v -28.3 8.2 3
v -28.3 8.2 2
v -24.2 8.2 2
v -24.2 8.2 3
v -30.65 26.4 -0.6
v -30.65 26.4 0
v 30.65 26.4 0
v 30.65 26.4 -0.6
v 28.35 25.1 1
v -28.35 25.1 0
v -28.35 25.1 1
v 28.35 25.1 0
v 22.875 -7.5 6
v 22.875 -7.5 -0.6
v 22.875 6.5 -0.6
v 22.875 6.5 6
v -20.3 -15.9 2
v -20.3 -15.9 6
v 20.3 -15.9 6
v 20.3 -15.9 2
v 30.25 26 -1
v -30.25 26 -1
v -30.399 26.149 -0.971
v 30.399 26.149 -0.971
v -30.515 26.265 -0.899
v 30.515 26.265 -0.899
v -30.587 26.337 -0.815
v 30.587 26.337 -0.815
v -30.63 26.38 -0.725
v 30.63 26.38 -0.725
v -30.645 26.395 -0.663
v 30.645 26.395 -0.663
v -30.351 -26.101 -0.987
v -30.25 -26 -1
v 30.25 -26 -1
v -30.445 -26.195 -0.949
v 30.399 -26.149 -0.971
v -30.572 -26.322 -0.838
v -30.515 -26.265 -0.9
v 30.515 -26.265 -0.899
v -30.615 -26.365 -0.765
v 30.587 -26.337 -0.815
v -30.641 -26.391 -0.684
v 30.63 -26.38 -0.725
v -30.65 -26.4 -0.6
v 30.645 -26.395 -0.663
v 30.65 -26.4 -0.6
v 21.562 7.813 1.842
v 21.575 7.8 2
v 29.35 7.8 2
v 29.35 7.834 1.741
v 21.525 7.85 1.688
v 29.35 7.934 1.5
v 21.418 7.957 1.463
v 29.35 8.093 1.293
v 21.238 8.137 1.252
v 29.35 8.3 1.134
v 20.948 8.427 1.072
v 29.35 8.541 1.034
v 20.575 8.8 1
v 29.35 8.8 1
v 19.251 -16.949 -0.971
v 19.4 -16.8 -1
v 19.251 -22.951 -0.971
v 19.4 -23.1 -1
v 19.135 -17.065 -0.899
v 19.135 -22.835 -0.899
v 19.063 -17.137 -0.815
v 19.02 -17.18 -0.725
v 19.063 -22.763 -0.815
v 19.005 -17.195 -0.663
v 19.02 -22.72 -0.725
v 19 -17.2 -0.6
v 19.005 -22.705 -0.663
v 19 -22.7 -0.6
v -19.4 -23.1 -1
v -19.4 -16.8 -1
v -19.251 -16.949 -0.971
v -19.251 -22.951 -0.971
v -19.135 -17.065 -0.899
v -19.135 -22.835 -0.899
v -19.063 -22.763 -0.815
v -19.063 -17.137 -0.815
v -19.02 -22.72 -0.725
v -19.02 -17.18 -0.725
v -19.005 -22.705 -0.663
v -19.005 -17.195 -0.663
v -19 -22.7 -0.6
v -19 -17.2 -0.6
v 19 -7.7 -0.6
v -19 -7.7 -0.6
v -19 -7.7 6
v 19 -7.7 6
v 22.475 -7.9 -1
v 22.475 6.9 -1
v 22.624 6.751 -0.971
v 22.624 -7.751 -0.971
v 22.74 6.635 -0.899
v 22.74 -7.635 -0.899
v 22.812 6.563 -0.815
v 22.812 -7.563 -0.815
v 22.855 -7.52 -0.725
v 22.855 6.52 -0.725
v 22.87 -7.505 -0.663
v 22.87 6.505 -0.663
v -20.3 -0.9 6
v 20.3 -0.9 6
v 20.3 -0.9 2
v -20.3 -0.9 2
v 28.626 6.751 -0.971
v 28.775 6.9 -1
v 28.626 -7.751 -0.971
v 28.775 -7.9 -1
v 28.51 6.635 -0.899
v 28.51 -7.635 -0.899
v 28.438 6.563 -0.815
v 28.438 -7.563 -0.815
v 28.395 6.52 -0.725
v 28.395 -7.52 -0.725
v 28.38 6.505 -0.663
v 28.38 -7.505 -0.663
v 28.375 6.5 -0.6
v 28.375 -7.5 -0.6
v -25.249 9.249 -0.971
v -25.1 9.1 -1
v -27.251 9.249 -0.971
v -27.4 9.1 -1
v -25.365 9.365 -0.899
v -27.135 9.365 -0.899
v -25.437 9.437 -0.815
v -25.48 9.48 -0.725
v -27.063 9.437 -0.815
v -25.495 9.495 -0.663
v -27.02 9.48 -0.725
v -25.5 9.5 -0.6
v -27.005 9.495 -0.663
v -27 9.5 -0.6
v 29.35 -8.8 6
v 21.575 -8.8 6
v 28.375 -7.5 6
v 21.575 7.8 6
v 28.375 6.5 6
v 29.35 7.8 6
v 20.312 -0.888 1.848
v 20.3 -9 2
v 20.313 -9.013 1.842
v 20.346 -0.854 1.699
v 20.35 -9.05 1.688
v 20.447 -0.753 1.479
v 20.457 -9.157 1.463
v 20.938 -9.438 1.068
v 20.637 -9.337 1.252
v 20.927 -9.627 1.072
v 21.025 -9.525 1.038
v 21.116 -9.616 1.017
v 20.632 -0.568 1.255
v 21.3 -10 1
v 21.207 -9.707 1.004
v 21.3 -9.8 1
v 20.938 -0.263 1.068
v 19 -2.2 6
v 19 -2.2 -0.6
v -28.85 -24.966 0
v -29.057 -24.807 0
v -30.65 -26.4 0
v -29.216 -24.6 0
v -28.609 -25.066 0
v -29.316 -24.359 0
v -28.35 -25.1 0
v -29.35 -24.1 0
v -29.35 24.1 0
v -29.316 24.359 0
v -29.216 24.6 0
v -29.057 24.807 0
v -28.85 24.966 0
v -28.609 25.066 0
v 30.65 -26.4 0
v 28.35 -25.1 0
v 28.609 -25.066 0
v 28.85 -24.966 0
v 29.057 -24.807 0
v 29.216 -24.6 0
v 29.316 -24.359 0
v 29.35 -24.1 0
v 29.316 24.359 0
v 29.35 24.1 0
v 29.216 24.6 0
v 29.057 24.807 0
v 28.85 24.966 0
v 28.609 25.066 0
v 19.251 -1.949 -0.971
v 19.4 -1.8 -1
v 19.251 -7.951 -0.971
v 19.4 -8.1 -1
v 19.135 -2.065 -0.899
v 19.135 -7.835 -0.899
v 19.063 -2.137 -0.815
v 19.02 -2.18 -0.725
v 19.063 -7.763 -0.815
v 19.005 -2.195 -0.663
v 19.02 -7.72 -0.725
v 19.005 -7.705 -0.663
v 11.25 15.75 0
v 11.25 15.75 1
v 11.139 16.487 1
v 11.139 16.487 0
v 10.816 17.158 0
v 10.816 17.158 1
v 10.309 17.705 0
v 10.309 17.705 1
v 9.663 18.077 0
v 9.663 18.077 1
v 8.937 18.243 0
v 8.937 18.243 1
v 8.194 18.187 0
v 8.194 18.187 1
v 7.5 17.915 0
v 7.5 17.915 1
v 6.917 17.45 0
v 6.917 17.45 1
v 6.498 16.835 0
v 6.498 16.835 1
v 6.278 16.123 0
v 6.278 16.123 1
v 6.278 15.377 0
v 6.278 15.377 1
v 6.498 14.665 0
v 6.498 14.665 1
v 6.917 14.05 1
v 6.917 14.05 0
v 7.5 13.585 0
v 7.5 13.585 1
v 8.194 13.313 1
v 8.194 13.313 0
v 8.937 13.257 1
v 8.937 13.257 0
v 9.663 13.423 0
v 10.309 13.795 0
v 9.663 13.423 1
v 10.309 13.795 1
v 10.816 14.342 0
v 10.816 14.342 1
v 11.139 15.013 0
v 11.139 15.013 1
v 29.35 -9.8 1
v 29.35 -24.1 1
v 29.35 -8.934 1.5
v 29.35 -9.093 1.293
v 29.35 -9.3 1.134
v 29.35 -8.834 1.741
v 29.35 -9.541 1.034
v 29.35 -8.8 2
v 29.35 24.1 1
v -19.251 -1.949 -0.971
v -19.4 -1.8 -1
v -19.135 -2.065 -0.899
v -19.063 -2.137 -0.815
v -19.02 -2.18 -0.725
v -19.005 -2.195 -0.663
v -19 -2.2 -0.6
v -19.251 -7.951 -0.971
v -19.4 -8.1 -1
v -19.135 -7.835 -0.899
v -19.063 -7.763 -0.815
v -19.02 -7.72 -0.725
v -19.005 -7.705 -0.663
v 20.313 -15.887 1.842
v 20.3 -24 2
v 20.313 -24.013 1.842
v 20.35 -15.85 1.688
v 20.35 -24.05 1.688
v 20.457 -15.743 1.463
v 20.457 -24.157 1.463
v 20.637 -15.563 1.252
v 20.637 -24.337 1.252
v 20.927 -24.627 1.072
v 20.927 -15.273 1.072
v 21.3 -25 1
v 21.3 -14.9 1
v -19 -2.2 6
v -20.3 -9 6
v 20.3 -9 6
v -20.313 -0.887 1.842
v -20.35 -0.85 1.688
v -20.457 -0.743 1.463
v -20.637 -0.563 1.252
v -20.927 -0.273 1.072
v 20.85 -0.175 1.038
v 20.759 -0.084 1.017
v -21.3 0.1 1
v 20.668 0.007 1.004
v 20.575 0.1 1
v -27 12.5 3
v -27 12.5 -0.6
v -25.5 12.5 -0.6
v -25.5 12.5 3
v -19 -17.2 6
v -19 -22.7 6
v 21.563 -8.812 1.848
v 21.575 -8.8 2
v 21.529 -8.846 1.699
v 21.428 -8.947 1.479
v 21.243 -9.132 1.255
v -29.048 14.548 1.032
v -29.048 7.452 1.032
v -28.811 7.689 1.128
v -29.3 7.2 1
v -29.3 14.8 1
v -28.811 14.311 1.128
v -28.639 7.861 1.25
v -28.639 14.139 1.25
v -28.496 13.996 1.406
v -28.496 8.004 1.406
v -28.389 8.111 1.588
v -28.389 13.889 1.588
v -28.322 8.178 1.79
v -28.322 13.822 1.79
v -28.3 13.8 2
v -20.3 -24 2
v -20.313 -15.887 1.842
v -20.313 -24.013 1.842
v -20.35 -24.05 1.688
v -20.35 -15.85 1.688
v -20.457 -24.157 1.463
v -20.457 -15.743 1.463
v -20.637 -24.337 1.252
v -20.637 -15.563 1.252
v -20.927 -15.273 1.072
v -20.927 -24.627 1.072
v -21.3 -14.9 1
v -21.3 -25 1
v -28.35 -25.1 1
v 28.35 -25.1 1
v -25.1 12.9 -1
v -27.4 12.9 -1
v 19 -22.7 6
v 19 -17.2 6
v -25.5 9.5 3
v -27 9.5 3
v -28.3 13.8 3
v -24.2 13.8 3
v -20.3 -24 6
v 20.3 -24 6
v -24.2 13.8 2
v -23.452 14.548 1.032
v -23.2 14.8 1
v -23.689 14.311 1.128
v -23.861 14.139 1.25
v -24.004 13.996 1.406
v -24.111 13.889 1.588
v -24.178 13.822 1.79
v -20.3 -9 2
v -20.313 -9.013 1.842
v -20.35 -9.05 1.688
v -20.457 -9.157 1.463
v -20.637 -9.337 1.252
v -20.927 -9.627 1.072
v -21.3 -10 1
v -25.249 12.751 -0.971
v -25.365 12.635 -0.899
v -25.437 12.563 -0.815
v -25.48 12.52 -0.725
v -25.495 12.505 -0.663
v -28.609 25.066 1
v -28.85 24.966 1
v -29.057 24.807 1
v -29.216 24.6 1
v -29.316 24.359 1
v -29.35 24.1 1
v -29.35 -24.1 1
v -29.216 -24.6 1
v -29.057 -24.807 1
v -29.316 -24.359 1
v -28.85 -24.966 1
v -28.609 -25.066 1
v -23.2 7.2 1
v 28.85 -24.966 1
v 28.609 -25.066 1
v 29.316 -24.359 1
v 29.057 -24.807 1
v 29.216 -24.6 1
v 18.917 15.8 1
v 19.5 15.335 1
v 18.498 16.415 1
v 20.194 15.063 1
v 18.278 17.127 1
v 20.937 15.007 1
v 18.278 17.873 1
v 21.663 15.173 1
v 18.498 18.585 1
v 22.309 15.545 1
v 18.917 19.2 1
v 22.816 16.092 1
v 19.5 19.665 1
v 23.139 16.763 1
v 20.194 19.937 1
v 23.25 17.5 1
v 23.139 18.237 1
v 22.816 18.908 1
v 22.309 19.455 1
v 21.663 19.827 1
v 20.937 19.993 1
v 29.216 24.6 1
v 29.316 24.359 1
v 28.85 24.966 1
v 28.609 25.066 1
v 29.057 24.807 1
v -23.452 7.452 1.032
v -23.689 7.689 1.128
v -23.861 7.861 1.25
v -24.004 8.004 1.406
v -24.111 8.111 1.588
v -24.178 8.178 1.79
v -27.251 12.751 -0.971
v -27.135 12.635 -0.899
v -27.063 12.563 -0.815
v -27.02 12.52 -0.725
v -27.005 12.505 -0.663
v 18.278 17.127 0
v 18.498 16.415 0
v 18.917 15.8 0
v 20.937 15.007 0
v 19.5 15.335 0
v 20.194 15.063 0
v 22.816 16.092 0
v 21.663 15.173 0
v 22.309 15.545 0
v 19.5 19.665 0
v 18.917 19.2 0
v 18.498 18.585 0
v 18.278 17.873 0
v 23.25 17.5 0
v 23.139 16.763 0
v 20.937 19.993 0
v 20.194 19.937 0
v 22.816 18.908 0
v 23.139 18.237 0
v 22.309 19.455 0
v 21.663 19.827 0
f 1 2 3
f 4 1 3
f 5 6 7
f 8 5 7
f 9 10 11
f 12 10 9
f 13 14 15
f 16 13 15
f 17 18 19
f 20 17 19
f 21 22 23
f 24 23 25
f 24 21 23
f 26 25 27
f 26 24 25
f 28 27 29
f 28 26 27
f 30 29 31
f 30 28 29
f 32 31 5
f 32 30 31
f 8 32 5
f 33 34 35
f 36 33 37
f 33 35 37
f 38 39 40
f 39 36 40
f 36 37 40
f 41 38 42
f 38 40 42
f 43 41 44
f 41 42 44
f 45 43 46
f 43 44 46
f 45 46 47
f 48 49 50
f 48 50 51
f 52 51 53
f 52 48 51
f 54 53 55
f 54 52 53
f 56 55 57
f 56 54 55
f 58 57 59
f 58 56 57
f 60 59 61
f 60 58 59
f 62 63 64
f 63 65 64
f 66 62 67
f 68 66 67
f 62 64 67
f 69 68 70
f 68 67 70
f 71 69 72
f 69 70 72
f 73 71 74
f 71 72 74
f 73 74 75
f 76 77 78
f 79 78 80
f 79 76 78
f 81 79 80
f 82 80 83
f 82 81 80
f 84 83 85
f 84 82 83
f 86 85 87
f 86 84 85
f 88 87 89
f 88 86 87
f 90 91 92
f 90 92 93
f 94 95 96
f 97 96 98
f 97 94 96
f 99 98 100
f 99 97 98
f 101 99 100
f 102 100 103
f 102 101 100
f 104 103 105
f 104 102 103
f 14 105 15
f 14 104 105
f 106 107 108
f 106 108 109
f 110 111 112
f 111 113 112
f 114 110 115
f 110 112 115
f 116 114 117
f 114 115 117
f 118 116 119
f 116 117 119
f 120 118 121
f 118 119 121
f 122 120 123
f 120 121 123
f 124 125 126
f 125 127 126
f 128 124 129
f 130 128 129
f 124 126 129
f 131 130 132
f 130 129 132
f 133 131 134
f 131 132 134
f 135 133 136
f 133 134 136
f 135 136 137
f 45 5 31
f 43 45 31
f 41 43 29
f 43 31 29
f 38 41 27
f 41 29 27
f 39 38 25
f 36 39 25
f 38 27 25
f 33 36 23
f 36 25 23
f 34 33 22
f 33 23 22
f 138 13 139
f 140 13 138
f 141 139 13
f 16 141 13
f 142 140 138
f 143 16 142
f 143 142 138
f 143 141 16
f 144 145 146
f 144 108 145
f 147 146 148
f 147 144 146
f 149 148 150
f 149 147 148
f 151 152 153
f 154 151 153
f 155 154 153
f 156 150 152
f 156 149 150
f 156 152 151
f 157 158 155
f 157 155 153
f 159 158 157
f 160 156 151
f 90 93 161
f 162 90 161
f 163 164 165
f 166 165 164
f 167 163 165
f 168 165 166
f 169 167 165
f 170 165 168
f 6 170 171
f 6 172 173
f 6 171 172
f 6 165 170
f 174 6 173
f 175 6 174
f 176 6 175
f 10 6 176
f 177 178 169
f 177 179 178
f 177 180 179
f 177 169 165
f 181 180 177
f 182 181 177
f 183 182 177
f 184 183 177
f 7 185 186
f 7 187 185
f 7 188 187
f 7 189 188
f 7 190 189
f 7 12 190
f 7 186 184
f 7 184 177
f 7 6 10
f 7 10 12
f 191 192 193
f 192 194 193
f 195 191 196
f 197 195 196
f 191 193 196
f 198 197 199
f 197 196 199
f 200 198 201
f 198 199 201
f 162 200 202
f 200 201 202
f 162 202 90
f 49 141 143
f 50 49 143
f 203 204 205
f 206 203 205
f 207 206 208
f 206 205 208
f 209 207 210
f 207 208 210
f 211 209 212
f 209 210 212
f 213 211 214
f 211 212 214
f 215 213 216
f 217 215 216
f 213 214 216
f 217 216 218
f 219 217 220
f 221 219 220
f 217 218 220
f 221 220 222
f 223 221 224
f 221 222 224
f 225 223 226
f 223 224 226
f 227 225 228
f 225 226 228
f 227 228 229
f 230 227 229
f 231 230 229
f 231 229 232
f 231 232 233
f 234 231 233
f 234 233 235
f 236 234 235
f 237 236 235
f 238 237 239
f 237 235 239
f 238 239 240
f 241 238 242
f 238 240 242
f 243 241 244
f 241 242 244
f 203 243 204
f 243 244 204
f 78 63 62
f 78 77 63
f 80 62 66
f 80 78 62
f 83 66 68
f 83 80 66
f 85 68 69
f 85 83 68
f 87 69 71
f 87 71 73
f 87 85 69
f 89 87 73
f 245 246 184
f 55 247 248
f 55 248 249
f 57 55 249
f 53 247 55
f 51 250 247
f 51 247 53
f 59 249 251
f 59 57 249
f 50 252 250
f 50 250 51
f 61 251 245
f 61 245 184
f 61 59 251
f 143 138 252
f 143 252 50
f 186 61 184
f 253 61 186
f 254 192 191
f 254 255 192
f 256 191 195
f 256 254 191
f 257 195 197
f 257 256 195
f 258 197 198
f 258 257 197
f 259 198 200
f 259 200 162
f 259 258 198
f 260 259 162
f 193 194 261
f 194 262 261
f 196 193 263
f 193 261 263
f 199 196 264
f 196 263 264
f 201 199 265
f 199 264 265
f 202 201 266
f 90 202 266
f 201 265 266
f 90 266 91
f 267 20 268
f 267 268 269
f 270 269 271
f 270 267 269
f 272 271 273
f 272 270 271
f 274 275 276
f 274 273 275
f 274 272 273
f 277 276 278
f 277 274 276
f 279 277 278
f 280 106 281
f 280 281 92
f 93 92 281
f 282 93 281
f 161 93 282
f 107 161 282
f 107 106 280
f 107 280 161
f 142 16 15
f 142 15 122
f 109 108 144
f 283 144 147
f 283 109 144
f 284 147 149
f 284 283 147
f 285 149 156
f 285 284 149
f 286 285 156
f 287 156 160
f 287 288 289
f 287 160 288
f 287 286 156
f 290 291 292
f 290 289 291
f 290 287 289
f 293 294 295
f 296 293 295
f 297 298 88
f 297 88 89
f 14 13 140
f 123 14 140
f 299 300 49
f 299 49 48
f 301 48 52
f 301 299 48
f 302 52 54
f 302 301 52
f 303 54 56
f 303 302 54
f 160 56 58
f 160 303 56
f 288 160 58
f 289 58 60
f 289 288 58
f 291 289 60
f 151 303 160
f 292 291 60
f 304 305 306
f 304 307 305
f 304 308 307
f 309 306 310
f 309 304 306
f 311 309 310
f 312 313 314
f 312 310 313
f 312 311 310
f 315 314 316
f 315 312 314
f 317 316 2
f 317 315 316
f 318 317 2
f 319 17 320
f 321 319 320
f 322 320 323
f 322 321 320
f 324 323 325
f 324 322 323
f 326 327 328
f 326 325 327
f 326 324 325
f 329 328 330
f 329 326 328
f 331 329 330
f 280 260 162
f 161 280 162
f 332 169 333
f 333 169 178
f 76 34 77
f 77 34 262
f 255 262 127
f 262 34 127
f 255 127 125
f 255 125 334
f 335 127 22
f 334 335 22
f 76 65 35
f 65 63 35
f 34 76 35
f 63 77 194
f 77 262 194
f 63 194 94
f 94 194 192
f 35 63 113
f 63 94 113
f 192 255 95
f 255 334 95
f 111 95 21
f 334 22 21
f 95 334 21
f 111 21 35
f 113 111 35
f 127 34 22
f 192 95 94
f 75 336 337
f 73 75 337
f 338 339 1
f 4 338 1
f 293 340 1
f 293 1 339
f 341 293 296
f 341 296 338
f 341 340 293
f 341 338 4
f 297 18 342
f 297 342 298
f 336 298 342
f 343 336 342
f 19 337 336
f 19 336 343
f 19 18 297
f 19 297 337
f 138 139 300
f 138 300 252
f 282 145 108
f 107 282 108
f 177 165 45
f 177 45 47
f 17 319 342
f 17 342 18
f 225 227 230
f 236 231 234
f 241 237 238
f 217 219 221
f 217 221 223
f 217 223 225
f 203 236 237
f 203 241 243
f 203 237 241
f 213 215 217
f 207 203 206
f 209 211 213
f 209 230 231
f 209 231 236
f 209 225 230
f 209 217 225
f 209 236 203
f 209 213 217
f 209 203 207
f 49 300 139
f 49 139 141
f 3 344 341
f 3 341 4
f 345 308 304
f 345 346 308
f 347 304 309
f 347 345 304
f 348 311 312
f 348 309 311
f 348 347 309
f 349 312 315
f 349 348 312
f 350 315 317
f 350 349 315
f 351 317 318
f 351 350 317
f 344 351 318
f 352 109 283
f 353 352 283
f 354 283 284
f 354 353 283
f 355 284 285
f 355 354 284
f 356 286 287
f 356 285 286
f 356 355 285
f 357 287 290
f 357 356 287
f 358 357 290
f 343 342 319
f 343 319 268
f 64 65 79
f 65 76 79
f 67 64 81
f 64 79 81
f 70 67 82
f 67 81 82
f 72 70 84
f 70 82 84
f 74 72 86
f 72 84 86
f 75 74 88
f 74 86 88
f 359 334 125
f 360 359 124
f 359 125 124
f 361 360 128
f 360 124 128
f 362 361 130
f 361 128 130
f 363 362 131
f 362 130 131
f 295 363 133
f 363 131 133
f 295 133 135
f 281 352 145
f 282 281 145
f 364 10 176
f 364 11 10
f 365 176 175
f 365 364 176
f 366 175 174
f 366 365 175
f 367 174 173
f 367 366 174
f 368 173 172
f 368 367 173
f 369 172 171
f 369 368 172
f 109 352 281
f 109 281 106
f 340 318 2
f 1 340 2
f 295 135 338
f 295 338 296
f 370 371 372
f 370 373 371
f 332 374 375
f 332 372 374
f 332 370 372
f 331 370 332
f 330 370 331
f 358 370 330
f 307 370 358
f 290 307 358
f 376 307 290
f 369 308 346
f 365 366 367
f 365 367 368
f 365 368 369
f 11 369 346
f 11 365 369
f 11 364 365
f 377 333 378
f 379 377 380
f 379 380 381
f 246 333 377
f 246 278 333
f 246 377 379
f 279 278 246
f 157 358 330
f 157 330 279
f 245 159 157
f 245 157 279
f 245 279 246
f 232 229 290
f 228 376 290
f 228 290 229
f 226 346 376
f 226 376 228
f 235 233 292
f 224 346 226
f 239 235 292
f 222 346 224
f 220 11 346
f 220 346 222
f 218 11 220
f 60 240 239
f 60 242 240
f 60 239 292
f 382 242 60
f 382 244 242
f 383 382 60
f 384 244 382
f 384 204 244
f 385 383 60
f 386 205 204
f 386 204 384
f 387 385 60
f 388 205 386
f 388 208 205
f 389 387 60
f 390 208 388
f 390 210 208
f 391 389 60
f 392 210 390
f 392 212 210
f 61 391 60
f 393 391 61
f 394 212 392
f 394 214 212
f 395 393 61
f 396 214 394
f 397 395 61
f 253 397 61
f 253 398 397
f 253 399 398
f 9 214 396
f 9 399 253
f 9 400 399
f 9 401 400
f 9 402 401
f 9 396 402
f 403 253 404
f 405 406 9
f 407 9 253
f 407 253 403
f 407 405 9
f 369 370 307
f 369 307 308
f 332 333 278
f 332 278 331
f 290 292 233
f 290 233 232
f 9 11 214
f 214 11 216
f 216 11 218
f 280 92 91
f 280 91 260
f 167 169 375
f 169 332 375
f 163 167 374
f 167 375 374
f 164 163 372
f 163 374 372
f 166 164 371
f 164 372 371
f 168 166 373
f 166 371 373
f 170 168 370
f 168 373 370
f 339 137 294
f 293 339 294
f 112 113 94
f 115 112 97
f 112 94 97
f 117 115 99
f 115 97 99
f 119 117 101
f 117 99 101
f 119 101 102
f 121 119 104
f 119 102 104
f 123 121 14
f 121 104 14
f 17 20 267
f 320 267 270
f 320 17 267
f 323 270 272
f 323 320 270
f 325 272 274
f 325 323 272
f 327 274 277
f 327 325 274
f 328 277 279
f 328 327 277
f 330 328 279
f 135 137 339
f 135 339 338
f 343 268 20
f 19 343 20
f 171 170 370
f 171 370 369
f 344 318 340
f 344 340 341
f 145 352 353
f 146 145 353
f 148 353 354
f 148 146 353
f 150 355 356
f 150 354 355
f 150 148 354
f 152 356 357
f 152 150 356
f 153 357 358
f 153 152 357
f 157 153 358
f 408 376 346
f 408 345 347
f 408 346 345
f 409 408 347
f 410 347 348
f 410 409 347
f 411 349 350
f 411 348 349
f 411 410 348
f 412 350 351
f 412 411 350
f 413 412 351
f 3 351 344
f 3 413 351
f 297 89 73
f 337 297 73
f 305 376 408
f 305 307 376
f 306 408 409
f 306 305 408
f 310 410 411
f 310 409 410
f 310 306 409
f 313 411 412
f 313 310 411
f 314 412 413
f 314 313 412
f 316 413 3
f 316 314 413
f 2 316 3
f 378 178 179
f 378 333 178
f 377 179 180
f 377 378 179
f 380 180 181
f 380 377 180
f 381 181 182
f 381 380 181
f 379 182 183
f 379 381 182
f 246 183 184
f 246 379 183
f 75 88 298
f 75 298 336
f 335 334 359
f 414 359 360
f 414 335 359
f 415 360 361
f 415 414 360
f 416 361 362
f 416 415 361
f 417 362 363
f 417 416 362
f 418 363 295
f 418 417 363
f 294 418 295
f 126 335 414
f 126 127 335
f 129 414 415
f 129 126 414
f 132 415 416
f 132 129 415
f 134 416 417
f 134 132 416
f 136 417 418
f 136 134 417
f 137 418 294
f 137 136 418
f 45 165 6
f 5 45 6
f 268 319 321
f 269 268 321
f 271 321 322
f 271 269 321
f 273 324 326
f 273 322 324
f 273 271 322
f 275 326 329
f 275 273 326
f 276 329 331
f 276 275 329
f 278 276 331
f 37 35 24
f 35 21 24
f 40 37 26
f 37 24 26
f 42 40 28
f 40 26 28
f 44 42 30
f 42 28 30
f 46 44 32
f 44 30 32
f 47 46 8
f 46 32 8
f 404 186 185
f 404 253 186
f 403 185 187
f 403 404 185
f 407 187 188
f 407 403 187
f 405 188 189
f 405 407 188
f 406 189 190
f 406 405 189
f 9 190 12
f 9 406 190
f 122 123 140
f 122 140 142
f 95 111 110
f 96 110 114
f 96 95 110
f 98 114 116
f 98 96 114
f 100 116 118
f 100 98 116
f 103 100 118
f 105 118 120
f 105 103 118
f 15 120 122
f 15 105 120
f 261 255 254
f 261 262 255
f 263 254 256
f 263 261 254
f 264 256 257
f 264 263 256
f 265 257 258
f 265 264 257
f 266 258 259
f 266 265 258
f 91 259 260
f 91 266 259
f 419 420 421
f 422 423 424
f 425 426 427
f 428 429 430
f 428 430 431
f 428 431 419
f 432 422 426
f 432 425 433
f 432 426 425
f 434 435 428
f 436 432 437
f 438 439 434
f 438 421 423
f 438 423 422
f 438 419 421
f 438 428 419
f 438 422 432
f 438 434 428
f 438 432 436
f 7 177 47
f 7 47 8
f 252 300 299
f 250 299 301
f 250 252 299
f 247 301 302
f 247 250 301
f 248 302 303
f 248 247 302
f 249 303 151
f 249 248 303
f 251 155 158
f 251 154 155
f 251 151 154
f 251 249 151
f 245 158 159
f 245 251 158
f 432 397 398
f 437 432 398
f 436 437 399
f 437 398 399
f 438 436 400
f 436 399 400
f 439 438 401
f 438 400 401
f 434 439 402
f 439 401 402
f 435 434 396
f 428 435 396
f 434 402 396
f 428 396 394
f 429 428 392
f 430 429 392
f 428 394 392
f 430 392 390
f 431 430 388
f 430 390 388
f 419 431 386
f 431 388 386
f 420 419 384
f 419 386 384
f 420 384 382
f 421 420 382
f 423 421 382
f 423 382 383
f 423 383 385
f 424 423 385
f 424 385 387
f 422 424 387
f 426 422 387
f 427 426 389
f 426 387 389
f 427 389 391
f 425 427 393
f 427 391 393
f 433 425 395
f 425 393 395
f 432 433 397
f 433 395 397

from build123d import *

# Parameters (mm, degrees)
OUTSIDE_DIM_W                         = 61.3
OUTSIDE_DIM_H                         = 52.8
DODANIE_WYCI_GNI_CIE1_DEPTH           = 1
INSIDE_DIM_W                          = 58.7
INSIDE_DIM_H                          = 50.2
DODANIE_WYCI_GNI_CIE2_DEPTH           = 1
CAPACITORS_R                          = 2.5
CAPACITORS_CUTOUT_DEPTH               = 1
RESET_BUTTON_W                        = 4.1
RESET_BUTTON_H                        = 5.6
RESET_BUTTON_SHIELD_DEPTH             = 2
RESET_BUTTON_CUTOUT_DEPTH             = 41.501635769
RESET_BUTTON_CUTOUT_DEPTH_BACK        = 41.501635769
SZKIC5_3_W                            = 1.5
SZKIC5_3_H                            = 3
SWDIO_W                               = 7.775
SWDIO_H                               = 16.6
SWDIO_SHIELD_DEPTH                    = 5
SWDIO_CUTOUT_DEPTH                    = 41.760060108
SWDIO_CUTOUT_DEPTH_BACK               = 41.760060108
SZKIC6_3_W                            = 5.5
SZKIC6_3_H                            = 14
ART_SKIN_CONNECTORS_W                 = 40.6
ART_SKIN_CONNECTORS_H                 = 8.1
ART_SKIN_CONNECTORS_W_2               = 38
ART_SKIN_CONNECTORS_H_2               = 5.5
ART_SKIN_CONNECTORS_SHIELD_DEPTH      = 5
ART_SKIN_CONNECTORS_CUTOUT_DEPTH      = 41.760060108
ART_SKIN_CONNECTORS_CUTOUT_DEPTH_BACK = 41.760060108
SZKIC7_2_W                            = 38
SZKIC7_2_H                            = 5.5
BOTTOM_OF_PRINT_CURVE_R               = 0.4
SIDE_MOUNT_SURVE_R                    = 1
CURVE_ALL_SHIELDS_R                   = 1


with BuildPart() as part:
    # Outside dim → Dodanie-wyciągnięcie1 (new body)
    with BuildSketch(Plane.XY):
        Rectangle(OUTSIDE_DIM_W, OUTSIDE_DIM_H)
    extrude(amount=-DODANIE_WYCI_GNI_CIE1_DEPTH)

    # Inside dim → Dodanie-wyciągnięcie2 (add)
    with BuildSketch(Plane.XY):
        Rectangle(INSIDE_DIM_W, INSIDE_DIM_H)
    extrude(amount=DODANIE_WYCI_GNI_CIE2_DEPTH)

    # Capacitors → Capacitors cutout (cut)
    with BuildSketch(Plane.XY.offset(1)):
        with Locations((8.75, 15.75)):
            Circle(CAPACITORS_R)
        with Locations((20.75, 17.5)):
            Circle(CAPACITORS_R)
    extrude(amount=-CAPACITORS_CUTOUT_DEPTH, mode=Mode.SUBTRACT)

    # Reset button → Reset button shield (add)
    with BuildSketch(Plane.XY.offset(1)):
        with Locations((-26.25, 11)):
            Rectangle(RESET_BUTTON_W, RESET_BUTTON_H)
    extrude(amount=RESET_BUTTON_SHIELD_DEPTH)

    # Szkic5<3> → Reset button cutout (cut, two sides: drawn at the far end of the back side and taken through both)
    with BuildSketch(Plane.XY.offset(1).offset(-RESET_BUTTON_CUTOUT_DEPTH_BACK)):
        with Locations((-26.25, 11)):
            Rectangle(SZKIC5_3_W, SZKIC5_3_H)
    extrude(amount=RESET_BUTTON_CUTOUT_DEPTH + RESET_BUTTON_CUTOUT_DEPTH_BACK, mode=Mode.SUBTRACT)

    # SWDIO → SWDIO shield (add)
    with BuildSketch(Plane.XY.offset(1)):
        with Locations((25.4625, -0.5)):
            Rectangle(SWDIO_W, SWDIO_H)
    extrude(amount=SWDIO_SHIELD_DEPTH)

    # Szkic6<3> → SWDIO cutout (cut, two sides: drawn at the far end of the back side and taken through both)
    with BuildSketch(Plane.XY.offset(1).offset(-SWDIO_CUTOUT_DEPTH_BACK)):
        with Locations((25.625, -0.5)):
            Rectangle(SZKIC6_3_W, SZKIC6_3_H)
    extrude(amount=SWDIO_CUTOUT_DEPTH + SWDIO_CUTOUT_DEPTH_BACK, mode=Mode.SUBTRACT)

    # Art skin connectors → Art skin connectors shield (add)
    # profile 1 of 2: a face of its own
    with BuildSketch(Plane.XY.offset(1)):
        with Locations((0, -19.95)):
            Rectangle(ART_SKIN_CONNECTORS_W, ART_SKIN_CONNECTORS_H)
        with Locations((0, -19.95)):
            Rectangle(ART_SKIN_CONNECTORS_W_2, ART_SKIN_CONNECTORS_H_2, mode=Mode.SUBTRACT)
    # profile 2 of 2: a face of its own
    with BuildSketch(Plane.XY.offset(1)):
        with Locations((0, -4.95)):
            Rectangle(ART_SKIN_CONNECTORS_W, ART_SKIN_CONNECTORS_H)
        with Locations((0, -4.95)):
            Rectangle(ART_SKIN_CONNECTORS_W_2, ART_SKIN_CONNECTORS_H_2, mode=Mode.SUBTRACT)
    extrude(amount=ART_SKIN_CONNECTORS_SHIELD_DEPTH)

    # Szkic7<2> → Art skin connectors cutout (cut, two sides: drawn at the far end of the back side and taken through both)
    with BuildSketch(Plane.XY.offset(1).offset(-ART_SKIN_CONNECTORS_CUTOUT_DEPTH_BACK)):
        with Locations((0, -4.95)):
            Rectangle(SZKIC7_2_W, SZKIC7_2_H)
        with Locations((0, -19.95)):
            Rectangle(SZKIC7_2_W, SZKIC7_2_H)
    extrude(amount=ART_SKIN_CONNECTORS_CUTOUT_DEPTH + ART_SKIN_CONNECTORS_CUTOUT_DEPTH_BACK, mode=Mode.SUBTRACT)

    # Bottom of print curve
    bottom_of_print_curve_edges = [part.edges().sort_by_distance(p)[0] for p in [
        (30.65, 0, -1),
        (0, -22.7, -1),
        (-19, -19.95, -1),
        (0, -17.2, -1),
        (19, -19.95, -1),
        (-19, -4.95, -1),
        (0, -7.7, -1),
        (0, -2.2, -1),
        (19, -4.95, -1),
        (0, 26.4, -1),
        (-30.65, 0, -1),
        (-27, 11, -1),
        (-26.25, 12.5, -1),
        (-25.5, 11, -1),
        (-26.25, 9.5, -1),
        (22.875, -0.5, -1),
        (25.625, -7.5, -1),
        (25.625, 6.5, -1),
        (28.375, -0.5, -1),
        (0, -26.4, -1),
    ]]
    fillet(bottom_of_print_curve_edges, radius=BOTTOM_OF_PRINT_CURVE_R)

    # Side mount surve
    side_mount_surve_edges = [part.edges().sort_by_distance(p)[0] for p in [
        (-29.35, 25.1, 0.5),
        (-29.35, -25.1, 0.5),
        (29.35, -25.1, 0.5),
        (29.35, 25.1, 0.5),
    ]]
    fillet(side_mount_surve_edges, radius=SIDE_MOUNT_SURVE_R)

    # Curve all shields
    # the kernel refuses this fillet: 1 mm, written as the material it adds along each edge
    with BuildSketch(Plane(origin=(-20.3, -24, 1), x_dir=(-1, 0, 0), z_dir=(0, 1, 0)), Plane(origin=(20.3, -0.9, 1), x_dir=(1, 0, 0), z_dir=(0, -1, 0)), Plane(origin=(-20.3, -9, 1), x_dir=(-1, 0, 0), z_dir=(0, 1, 0)), Plane(origin=(20.3, -15.9, 1), x_dir=(1, 0, 0), z_dir=(0, -1, 0))) as curve_all_shields_piece_1:
        with BuildLine():
            CenterArc((CURVE_ALL_SHIELDS_R, CURVE_ALL_SHIELDS_R), CURVE_ALL_SHIELDS_R, 180, 90)
            Line((0, CURVE_ALL_SHIELDS_R), (0, 0))
            Line((0, 0), (CURVE_ALL_SHIELDS_R, 0))
        make_face()
    extrude(amount=8.1)
    with BuildSketch(Plane(origin=(-20.3, -0.9, 1), x_dir=(0, 1, 0), z_dir=(1, 0, 0)), Plane(origin=(20.3, -9, 1), x_dir=(0, -1, 0), z_dir=(-1, 0, 0)), Plane(origin=(-20.3, -15.9, 1), x_dir=(0, 1, 0), z_dir=(1, 0, 0)), Plane(origin=(20.3, -24, 1), x_dir=(0, -1, 0), z_dir=(-1, 0, 0))) as curve_all_shields_piece_2:
        with BuildLine():
            CenterArc((CURVE_ALL_SHIELDS_R, CURVE_ALL_SHIELDS_R), CURVE_ALL_SHIELDS_R, 180, 90)
            Line((0, CURVE_ALL_SHIELDS_R), (0, 0))
            Line((0, 0), (CURVE_ALL_SHIELDS_R, 0))
        make_face()
    extrude(amount=40.6)
    with BuildSketch(Plane(origin=(-24.2, 13.8, 1), x_dir=(0, 1, 0), z_dir=(-1, 0, 0)), Plane(origin=(-28.3, 8.2, 1), x_dir=(0, -1, 0), z_dir=(1, 0, 0))) as curve_all_shields_piece_3:
        with BuildLine():
            CenterArc((CURVE_ALL_SHIELDS_R, -CURVE_ALL_SHIELDS_R), CURVE_ALL_SHIELDS_R, 90, 90)
            Line((0, -CURVE_ALL_SHIELDS_R), (0, 0))
            Line((0, 0), (CURVE_ALL_SHIELDS_R, 0))
        make_face()
    extrude(amount=4.1)
    with BuildSketch(Plane(origin=(-28.3, 13.8, 1), x_dir=(-1, 0, 0), z_dir=(0, -1, 0)), Plane(origin=(-24.2, 8.2, 1), x_dir=(1, 0, 0), z_dir=(0, 1, 0))) as curve_all_shields_piece_4:
        with BuildLine():
            CenterArc((CURVE_ALL_SHIELDS_R, -CURVE_ALL_SHIELDS_R), CURVE_ALL_SHIELDS_R, 90, 90)
            Line((0, -CURVE_ALL_SHIELDS_R), (0, 0))
            Line((0, 0), (CURVE_ALL_SHIELDS_R, 0))
        make_face()
    extrude(amount=5.6)
    with BuildSketch(Plane(origin=(21.575, -8.8, 1), x_dir=(-1, 0, 0), z_dir=(0, 1, 0))) as curve_all_shields_piece_5:
        with BuildLine():
            CenterArc((CURVE_ALL_SHIELDS_R, CURVE_ALL_SHIELDS_R), CURVE_ALL_SHIELDS_R, 180, 90)
            Line((0, CURVE_ALL_SHIELDS_R), (0, 0))
            Line((0, 0), (CURVE_ALL_SHIELDS_R, 0))
        make_face()
    extrude(amount=16.6)
    with BuildSketch(Plane(origin=(29.35, -8.8, 1), x_dir=(0, -1, 0), z_dir=(-1, 0, 0)), Plane(origin=(21.575, 7.8, 1), x_dir=(0, 1, 0), z_dir=(1, 0, 0))) as curve_all_shields_piece_6:
        with BuildLine():
            CenterArc((CURVE_ALL_SHIELDS_R, CURVE_ALL_SHIELDS_R), CURVE_ALL_SHIELDS_R, 180, 90)
            Line((0, CURVE_ALL_SHIELDS_R), (0, 0))
            Line((0, 0), (CURVE_ALL_SHIELDS_R, 0))
        make_face()
    extrude(amount=7.775)
    with BuildSketch(Plane(origin=(20.3, -24, 1), x_dir=(0, -1, 0), z_dir=(-1, 0, 0))) as curve_all_shields_piece_7a_section:
        with BuildLine():
            CenterArc((CURVE_ALL_SHIELDS_R, CURVE_ALL_SHIELDS_R), CURVE_ALL_SHIELDS_R, 180, 90)
            Line((0, CURVE_ALL_SHIELDS_R), (0, 0))
            Line((0, 0), (CURVE_ALL_SHIELDS_R, 0))
        make_face()
    curve_all_shields_piece_7a = extrude(amount=43.1, mode=Mode.PRIVATE)
    curve_all_shields_piece_7a = split(curve_all_shields_piece_7a, bisect_by=Plane(origin=(-20.3, -24.226395114, 1.226395114), z_dir=(-1, 0, 0)), keep=Keep.TOP, mode=Mode.PRIVATE)
    with BuildSketch(Plane(origin=(-20.3, -26.5, 1), x_dir=(-1, 0, 0), z_dir=(0, 1, 0))) as curve_all_shields_piece_7b_section:
        with BuildLine():
            CenterArc((CURVE_ALL_SHIELDS_R, CURVE_ALL_SHIELDS_R), CURVE_ALL_SHIELDS_R, 180, 90)
            Line((0, CURVE_ALL_SHIELDS_R), (0, 0))
            Line((0, 0), (CURVE_ALL_SHIELDS_R, 0))
        make_face()
    curve_all_shields_piece_7b = extrude(amount=10.6, mode=Mode.PRIVATE)
    curve_all_shields_piece_7b = split(curve_all_shields_piece_7b, bisect_by=Plane(origin=(-20.526395114, -25.1, 1.226395114), z_dir=(0, 1, 0)), keep=Keep.TOP, mode=Mode.PRIVATE)
    curve_all_shields_piece_7b = split(curve_all_shields_piece_7b, bisect_by=Plane(origin=(-20.526395114, -24, 1.226395114), z_dir=(0, -1, 0)), keep=Keep.TOP, mode=Mode.PRIVATE)
    curve_all_shields_piece_7 = curve_all_shields_piece_7a & curve_all_shields_piece_7b
    add(curve_all_shields_piece_7)
    with BuildSketch(Plane(origin=(-22.8, -15.9, 1), x_dir=(0, 1, 0), z_dir=(1, 0, 0))) as curve_all_shields_piece_8a_section:
        with BuildLine():
            CenterArc((CURVE_ALL_SHIELDS_R, CURVE_ALL_SHIELDS_R), CURVE_ALL_SHIELDS_R, 180, 90)
            Line((0, CURVE_ALL_SHIELDS_R), (0, 0))
            Line((0, 0), (CURVE_ALL_SHIELDS_R, 0))
        make_face()
    curve_all_shields_piece_8a = extrude(amount=43.1, mode=Mode.PRIVATE)
    curve_all_shields_piece_8a = split(curve_all_shields_piece_8a, bisect_by=Plane(origin=(-20.3, -15.673604886, 1.226395114), z_dir=(-1, 0, 0)), keep=Keep.TOP, mode=Mode.PRIVATE)
    with BuildSketch(Plane(origin=(-20.3, -24, 1), x_dir=(-1, 0, 0), z_dir=(0, 1, 0))) as curve_all_shields_piece_8b_section:
        with BuildLine():
            CenterArc((CURVE_ALL_SHIELDS_R, CURVE_ALL_SHIELDS_R), CURVE_ALL_SHIELDS_R, 180, 90)
            Line((0, CURVE_ALL_SHIELDS_R), (0, 0))
            Line((0, 0), (CURVE_ALL_SHIELDS_R, 0))
        make_face()
    curve_all_shields_piece_8b = extrude(amount=10.6, mode=Mode.PRIVATE)
    curve_all_shields_piece_8b = split(curve_all_shields_piece_8b, bisect_by=Plane(origin=(-20.526395114, -15.9, 1.226395114), z_dir=(0, 1, 0)), keep=Keep.TOP, mode=Mode.PRIVATE)
    curve_all_shields_piece_8 = curve_all_shields_piece_8a & curve_all_shields_piece_8b
    add(curve_all_shields_piece_8)
    with BuildSketch(Plane(origin=(-22.8, -0.9, 1), x_dir=(0, 1, 0), z_dir=(1, 0, 0))) as curve_all_shields_piece_9a_section:
        with BuildLine():
            CenterArc((CURVE_ALL_SHIELDS_R, CURVE_ALL_SHIELDS_R), CURVE_ALL_SHIELDS_R, 180, 90)
            Line((0, CURVE_ALL_SHIELDS_R), (0, 0))
            Line((0, 0), (CURVE_ALL_SHIELDS_R, 0))
        make_face()
    curve_all_shields_piece_9a = extrude(amount=43.1, mode=Mode.PRIVATE)
    curve_all_shields_piece_9a = split(curve_all_shields_piece_9a, bisect_by=Plane(origin=(-20.3, -0.673604886, 1.226395114), z_dir=(-1, 0, 0)), keep=Keep.TOP, mode=Mode.PRIVATE)
    with BuildSketch(Plane(origin=(-20.3, -9, 1), x_dir=(-1, 0, 0), z_dir=(0, 1, 0))) as curve_all_shields_piece_9b_section:
        with BuildLine():
            CenterArc((CURVE_ALL_SHIELDS_R, CURVE_ALL_SHIELDS_R), CURVE_ALL_SHIELDS_R, 180, 90)
            Line((0, CURVE_ALL_SHIELDS_R), (0, 0))
            Line((0, 0), (CURVE_ALL_SHIELDS_R, 0))
        make_face()
    curve_all_shields_piece_9b = extrude(amount=10.6, mode=Mode.PRIVATE)
    curve_all_shields_piece_9b = split(curve_all_shields_piece_9b, bisect_by=Plane(origin=(-20.526395114, -0.9, 1.226395114), z_dir=(0, 1, 0)), keep=Keep.TOP, mode=Mode.PRIVATE)
    curve_all_shields_piece_9 = curve_all_shields_piece_9a & curve_all_shields_piece_9b
    add(curve_all_shields_piece_9)
    with BuildSketch(Plane(origin=(-20.3, -0.9, 1), x_dir=(0, 1, 0), z_dir=(1, 0, 0))) as curve_all_shields_piece_10a_section:
        with BuildLine():
            CenterArc((CURVE_ALL_SHIELDS_R, CURVE_ALL_SHIELDS_R), CURVE_ALL_SHIELDS_R, 180, 90)
            Line((0, CURVE_ALL_SHIELDS_R), (0, 0))
            Line((0, 0), (CURVE_ALL_SHIELDS_R, 0))
        make_face()
    curve_all_shields_piece_10a = extrude(amount=43.1, mode=Mode.PRIVATE)
    curve_all_shields_piece_10a = split(curve_all_shields_piece_10a, bisect_by=Plane(origin=(20.3, -0.673604886, 1.226395114), z_dir=(1, 0, 0)), keep=Keep.TOP, mode=Mode.PRIVATE)
    with BuildSketch(Plane(origin=(20.3, 1.6, 1), x_dir=(1, 0, 0), z_dir=(0, -1, 0))) as curve_all_shields_piece_10b_section:
        with BuildLine():
            CenterArc((CURVE_ALL_SHIELDS_R, CURVE_ALL_SHIELDS_R), CURVE_ALL_SHIELDS_R, 180, 90)
            Line((0, CURVE_ALL_SHIELDS_R), (0, 0))
            Line((0, 0), (CURVE_ALL_SHIELDS_R, 0))
        make_face()
    curve_all_shields_piece_10b = extrude(amount=10.6, mode=Mode.PRIVATE)
    curve_all_shields_piece_10b = split(curve_all_shields_piece_10b, bisect_by=Plane(origin=(20.526395114, -0.9, 1.226395114), z_dir=(0, 1, 0)), keep=Keep.TOP, mode=Mode.PRIVATE)
    curve_all_shields_piece_10 = curve_all_shields_piece_10a & curve_all_shields_piece_10b
    add(curve_all_shields_piece_10)
    with BuildSketch(Plane(origin=(20.3, -0.9, 1), x_dir=(1, 0, 0), z_dir=(0, -1, 0))) as curve_all_shields_piece_11a_section:
        with BuildLine():
            CenterArc((CURVE_ALL_SHIELDS_R, CURVE_ALL_SHIELDS_R), CURVE_ALL_SHIELDS_R, 180, 90)
            Line((0, CURVE_ALL_SHIELDS_R), (0, 0))
            Line((0, 0), (CURVE_ALL_SHIELDS_R, 0))
        make_face()
    curve_all_shields_piece_11a = extrude(amount=10.6, mode=Mode.PRIVATE)
    curve_all_shields_piece_11a = split(curve_all_shields_piece_11a, bisect_by=Plane(origin=(20.526395114, -9, 1.226395114), z_dir=(0, -1, 0)), keep=Keep.TOP, mode=Mode.PRIVATE)
    with BuildSketch(Plane(origin=(22.8, -9, 1), x_dir=(0, -1, 0), z_dir=(-1, 0, 0))) as curve_all_shields_piece_11b_section:
        with BuildLine():
            CenterArc((CURVE_ALL_SHIELDS_R, CURVE_ALL_SHIELDS_R), CURVE_ALL_SHIELDS_R, 180, 90)
            Line((0, CURVE_ALL_SHIELDS_R), (0, 0))
            Line((0, 0), (CURVE_ALL_SHIELDS_R, 0))
        make_face()
    curve_all_shields_piece_11b = extrude(amount=43.1, mode=Mode.PRIVATE)
    curve_all_shields_piece_11b = split(curve_all_shields_piece_11b, bisect_by=Plane(origin=(20.3, -9.226395114, 1.226395114), z_dir=(1, 0, 0)), keep=Keep.TOP, mode=Mode.PRIVATE)
    curve_all_shields_piece_11 = curve_all_shields_piece_11a & curve_all_shields_piece_11b
    add(curve_all_shields_piece_11)
    with BuildSketch(Plane(origin=(20.3, -9, 1), x_dir=(0, -1, 0), z_dir=(-1, 0, 0))) as curve_all_shields_piece_12a_section:
        with BuildLine():
            CenterArc((CURVE_ALL_SHIELDS_R, CURVE_ALL_SHIELDS_R), CURVE_ALL_SHIELDS_R, 180, 90)
            Line((0, CURVE_ALL_SHIELDS_R), (0, 0))
            Line((0, 0), (CURVE_ALL_SHIELDS_R, 0))
        make_face()
    curve_all_shields_piece_12a = extrude(amount=43.1, mode=Mode.PRIVATE)
    curve_all_shields_piece_12a = split(curve_all_shields_piece_12a, bisect_by=Plane(origin=(-20.3, -9.226395114, 1.226395114), z_dir=(-1, 0, 0)), keep=Keep.TOP, mode=Mode.PRIVATE)
    with BuildSketch(Plane(origin=(-20.3, -11.5, 1), x_dir=(-1, 0, 0), z_dir=(0, 1, 0))) as curve_all_shields_piece_12b_section:
        with BuildLine():
            CenterArc((CURVE_ALL_SHIELDS_R, CURVE_ALL_SHIELDS_R), CURVE_ALL_SHIELDS_R, 180, 90)
            Line((0, CURVE_ALL_SHIELDS_R), (0, 0))
            Line((0, 0), (CURVE_ALL_SHIELDS_R, 0))
        make_face()
    curve_all_shields_piece_12b = extrude(amount=10.6, mode=Mode.PRIVATE)
    curve_all_shields_piece_12b = split(curve_all_shields_piece_12b, bisect_by=Plane(origin=(-20.526395114, -9, 1.226395114), z_dir=(0, -1, 0)), keep=Keep.TOP, mode=Mode.PRIVATE)
    curve_all_shields_piece_12 = curve_all_shields_piece_12a & curve_all_shields_piece_12b
    add(curve_all_shields_piece_12)
    with BuildSketch(Plane(origin=(-24.2, 8.2, 1), x_dir=(1, 0, 0), z_dir=(0, 1, 0))) as curve_all_shields_piece_13a_section:
        with BuildLine():
            CenterArc((CURVE_ALL_SHIELDS_R, -CURVE_ALL_SHIELDS_R), CURVE_ALL_SHIELDS_R, 90, 90)
            Line((0, -CURVE_ALL_SHIELDS_R), (0, 0))
            Line((0, 0), (CURVE_ALL_SHIELDS_R, 0))
        make_face()
    curve_all_shields_piece_13a = extrude(amount=8.1, mode=Mode.PRIVATE)
    curve_all_shields_piece_13a = split(curve_all_shields_piece_13a, bisect_by=Plane(origin=(-23.973604886, 13.8, 1.226395114), z_dir=(0, 1, 0)), keep=Keep.TOP, mode=Mode.PRIVATE)
    with BuildSketch(Plane(origin=(-21.7, 13.8, 1), x_dir=(0, 1, 0), z_dir=(-1, 0, 0))) as curve_all_shields_piece_13b_section:
        with BuildLine():
            CenterArc((CURVE_ALL_SHIELDS_R, -CURVE_ALL_SHIELDS_R), CURVE_ALL_SHIELDS_R, 90, 90)
            Line((0, -CURVE_ALL_SHIELDS_R), (0, 0))
            Line((0, 0), (CURVE_ALL_SHIELDS_R, 0))
        make_face()
    curve_all_shields_piece_13b = extrude(amount=6.6, mode=Mode.PRIVATE)
    curve_all_shields_piece_13b = split(curve_all_shields_piece_13b, bisect_by=Plane(origin=(-24.2, 14.026395114, 1.226395114), z_dir=(1, 0, 0)), keep=Keep.TOP, mode=Mode.PRIVATE)
    curve_all_shields_piece_13 = curve_all_shields_piece_13a & curve_all_shields_piece_13b
    add(curve_all_shields_piece_13)
    with BuildSketch(Plane(origin=(-24.2, 13.8, 1), x_dir=(0, 1, 0), z_dir=(-1, 0, 0))) as curve_all_shields_piece_14a_section:
        with BuildLine():
            CenterArc((CURVE_ALL_SHIELDS_R, -CURVE_ALL_SHIELDS_R), CURVE_ALL_SHIELDS_R, 90, 90)
            Line((0, -CURVE_ALL_SHIELDS_R), (0, 0))
            Line((0, 0), (CURVE_ALL_SHIELDS_R, 0))
        make_face()
    curve_all_shields_piece_14a = extrude(amount=6.6, mode=Mode.PRIVATE)
    curve_all_shields_piece_14a = split(curve_all_shields_piece_14a, bisect_by=Plane(origin=(-29.35, 14.026395114, 1.226395114), z_dir=(1, 0, 0)), keep=Keep.TOP, mode=Mode.PRIVATE)
    curve_all_shields_piece_14a = split(curve_all_shields_piece_14a, bisect_by=Plane(origin=(-28.3, 14.026395114, 1.226395114), z_dir=(-1, 0, 0)), keep=Keep.TOP, mode=Mode.PRIVATE)
    with BuildSketch(Plane(origin=(-28.3, 16.3, 1), x_dir=(-1, 0, 0), z_dir=(0, -1, 0))) as curve_all_shields_piece_14b_section:
        with BuildLine():
            CenterArc((CURVE_ALL_SHIELDS_R, -CURVE_ALL_SHIELDS_R), CURVE_ALL_SHIELDS_R, 90, 90)
            Line((0, -CURVE_ALL_SHIELDS_R), (0, 0))
            Line((0, 0), (CURVE_ALL_SHIELDS_R, 0))
        make_face()
    curve_all_shields_piece_14b = extrude(amount=8.1, mode=Mode.PRIVATE)
    curve_all_shields_piece_14b = split(curve_all_shields_piece_14b, bisect_by=Plane(origin=(-28.526395114, 13.8, 1.226395114), z_dir=(0, 1, 0)), keep=Keep.TOP, mode=Mode.PRIVATE)
    curve_all_shields_piece_14 = curve_all_shields_piece_14a & curve_all_shields_piece_14b
    add(curve_all_shields_piece_14)
    with BuildSketch(Plane(origin=(-30.8, 8.2, 1), x_dir=(0, -1, 0), z_dir=(1, 0, 0))) as curve_all_shields_piece_15a_section:
        with BuildLine():
            CenterArc((CURVE_ALL_SHIELDS_R, -CURVE_ALL_SHIELDS_R), CURVE_ALL_SHIELDS_R, 90, 90)
            Line((0, -CURVE_ALL_SHIELDS_R), (0, 0))
            Line((0, 0), (CURVE_ALL_SHIELDS_R, 0))
        make_face()
    curve_all_shields_piece_15a = extrude(amount=6.6, mode=Mode.PRIVATE)
    curve_all_shields_piece_15a = split(curve_all_shields_piece_15a, bisect_by=Plane(origin=(-29.35, 7.973604886, 1.226395114), z_dir=(1, 0, 0)), keep=Keep.TOP, mode=Mode.PRIVATE)
    curve_all_shields_piece_15a = split(curve_all_shields_piece_15a, bisect_by=Plane(origin=(-28.3, 7.973604886, 1.226395114), z_dir=(-1, 0, 0)), keep=Keep.TOP, mode=Mode.PRIVATE)
    with BuildSketch(Plane(origin=(-28.3, 13.8, 1), x_dir=(-1, 0, 0), z_dir=(0, -1, 0))) as curve_all_shields_piece_15b_section:
        with BuildLine():
            CenterArc((CURVE_ALL_SHIELDS_R, -CURVE_ALL_SHIELDS_R), CURVE_ALL_SHIELDS_R, 90, 90)
            Line((0, -CURVE_ALL_SHIELDS_R), (0, 0))
            Line((0, 0), (CURVE_ALL_SHIELDS_R, 0))
        make_face()
    curve_all_shields_piece_15b = extrude(amount=8.1, mode=Mode.PRIVATE)
    curve_all_shields_piece_15b = split(curve_all_shields_piece_15b, bisect_by=Plane(origin=(-28.526395114, 8.2, 1.226395114), z_dir=(0, -1, 0)), keep=Keep.TOP, mode=Mode.PRIVATE)
    curve_all_shields_piece_15 = curve_all_shields_piece_15a & curve_all_shields_piece_15b
    add(curve_all_shields_piece_15)
    with BuildSketch(Plane(origin=(-24.2, 5.7, 1), x_dir=(1, 0, 0), z_dir=(0, 1, 0))) as curve_all_shields_piece_16a_section:
        with BuildLine():
            CenterArc((CURVE_ALL_SHIELDS_R, -CURVE_ALL_SHIELDS_R), CURVE_ALL_SHIELDS_R, 90, 90)
            Line((0, -CURVE_ALL_SHIELDS_R), (0, 0))
            Line((0, 0), (CURVE_ALL_SHIELDS_R, 0))
        make_face()
    curve_all_shields_piece_16a = extrude(amount=8.1, mode=Mode.PRIVATE)
    curve_all_shields_piece_16a = split(curve_all_shields_piece_16a, bisect_by=Plane(origin=(-23.973604886, 8.2, 1.226395114), z_dir=(0, -1, 0)), keep=Keep.TOP, mode=Mode.PRIVATE)
    with BuildSketch(Plane(origin=(-28.3, 8.2, 1), x_dir=(0, -1, 0), z_dir=(1, 0, 0))) as curve_all_shields_piece_16b_section:
        with BuildLine():
            CenterArc((CURVE_ALL_SHIELDS_R, -CURVE_ALL_SHIELDS_R), CURVE_ALL_SHIELDS_R, 90, 90)
            Line((0, -CURVE_ALL_SHIELDS_R), (0, 0))
            Line((0, 0), (CURVE_ALL_SHIELDS_R, 0))
        make_face()
    curve_all_shields_piece_16b = extrude(amount=6.6, mode=Mode.PRIVATE)
    curve_all_shields_piece_16b = split(curve_all_shields_piece_16b, bisect_by=Plane(origin=(-24.2, 7.973604886, 1.226395114), z_dir=(1, 0, 0)), keep=Keep.TOP, mode=Mode.PRIVATE)
    curve_all_shields_piece_16 = curve_all_shields_piece_16a & curve_all_shields_piece_16b
    add(curve_all_shields_piece_16)
    with BuildSketch(Plane(origin=(29.35, -8.8, 1), x_dir=(0, -1, 0), z_dir=(-1, 0, 0))) as curve_all_shields_piece_17a_section:
        with BuildLine():
            CenterArc((CURVE_ALL_SHIELDS_R, CURVE_ALL_SHIELDS_R), CURVE_ALL_SHIELDS_R, 180, 90)
            Line((0, CURVE_ALL_SHIELDS_R), (0, 0))
            Line((0, 0), (CURVE_ALL_SHIELDS_R, 0))
        make_face()
    curve_all_shields_piece_17a = extrude(amount=10.275, mode=Mode.PRIVATE)
    curve_all_shields_piece_17a = split(curve_all_shields_piece_17a, bisect_by=Plane(origin=(21.575, -9.026395114, 1.226395114), z_dir=(-1, 0, 0)), keep=Keep.TOP, mode=Mode.PRIVATE)
    with BuildSketch(Plane(origin=(21.575, -11.3, 1), x_dir=(-1, 0, 0), z_dir=(0, 1, 0))) as curve_all_shields_piece_17b_section:
        with BuildLine():
            CenterArc((CURVE_ALL_SHIELDS_R, CURVE_ALL_SHIELDS_R), CURVE_ALL_SHIELDS_R, 180, 90)
            Line((0, CURVE_ALL_SHIELDS_R), (0, 0))
            Line((0, 0), (CURVE_ALL_SHIELDS_R, 0))
        make_face()
    curve_all_shields_piece_17b = extrude(amount=19.1, mode=Mode.PRIVATE)
    curve_all_shields_piece_17b = split(curve_all_shields_piece_17b, bisect_by=Plane(origin=(21.348604886, -8.8, 1.226395114), z_dir=(0, -1, 0)), keep=Keep.TOP, mode=Mode.PRIVATE)
    curve_all_shields_piece_17 = curve_all_shields_piece_17a & curve_all_shields_piece_17b
    add(curve_all_shields_piece_17)
    with BuildSketch(Plane(origin=(19.075, 7.8, 1), x_dir=(0, 1, 0), z_dir=(1, 0, 0))) as curve_all_shields_piece_18a_section:
        with BuildLine():
            CenterArc((CURVE_ALL_SHIELDS_R, CURVE_ALL_SHIELDS_R), CURVE_ALL_SHIELDS_R, 180, 90)
            Line((0, CURVE_ALL_SHIELDS_R), (0, 0))
            Line((0, 0), (CURVE_ALL_SHIELDS_R, 0))
        make_face()
    curve_all_shields_piece_18a = extrude(amount=10.275, mode=Mode.PRIVATE)
    curve_all_shields_piece_18a = split(curve_all_shields_piece_18a, bisect_by=Plane(origin=(21.575, 8.026395114, 1.226395114), z_dir=(-1, 0, 0)), keep=Keep.TOP, mode=Mode.PRIVATE)
    with BuildSketch(Plane(origin=(21.575, -8.8, 1), x_dir=(-1, 0, 0), z_dir=(0, 1, 0))) as curve_all_shields_piece_18b_section:
        with BuildLine():
            CenterArc((CURVE_ALL_SHIELDS_R, CURVE_ALL_SHIELDS_R), CURVE_ALL_SHIELDS_R, 180, 90)
            Line((0, CURVE_ALL_SHIELDS_R), (0, 0))
            Line((0, 0), (CURVE_ALL_SHIELDS_R, 0))
        make_face()
    curve_all_shields_piece_18b = extrude(amount=19.1, mode=Mode.PRIVATE)
    curve_all_shields_piece_18b = split(curve_all_shields_piece_18b, bisect_by=Plane(origin=(21.348604886, 7.8, 1.226395114), z_dir=(0, 1, 0)), keep=Keep.TOP, mode=Mode.PRIVATE)
    curve_all_shields_piece_18 = curve_all_shields_piece_18a & curve_all_shields_piece_18b
    add(curve_all_shields_piece_18)
    with BuildSketch(Plane(origin=(-20.3, -15.9, 1), x_dir=(0, 1, 0), z_dir=(1, 0, 0))) as curve_all_shields_piece_19a_section:
        with BuildLine():
            CenterArc((CURVE_ALL_SHIELDS_R, CURVE_ALL_SHIELDS_R), CURVE_ALL_SHIELDS_R, 180, 90)
            Line((0, CURVE_ALL_SHIELDS_R), (0, 0))
            Line((0, 0), (CURVE_ALL_SHIELDS_R, 0))
        make_face()
    curve_all_shields_piece_19a = extrude(amount=43.1, mode=Mode.PRIVATE)
    curve_all_shields_piece_19a = split(curve_all_shields_piece_19a, bisect_by=Plane(origin=(20.3, -15.673604886, 1.226395114), z_dir=(1, 0, 0)), keep=Keep.TOP, mode=Mode.PRIVATE)
    with BuildSketch(Plane(origin=(20.3, -13.4, 1), x_dir=(1, 0, 0), z_dir=(0, -1, 0))) as curve_all_shields_piece_19b_section:
        with BuildLine():
            CenterArc((CURVE_ALL_SHIELDS_R, CURVE_ALL_SHIELDS_R), CURVE_ALL_SHIELDS_R, 180, 90)
            Line((0, CURVE_ALL_SHIELDS_R), (0, 0))
            Line((0, 0), (CURVE_ALL_SHIELDS_R, 0))
        make_face()
    curve_all_shields_piece_19b = extrude(amount=10.6, mode=Mode.PRIVATE)
    curve_all_shields_piece_19b = split(curve_all_shields_piece_19b, bisect_by=Plane(origin=(20.526395114, -15.9, 1.226395114), z_dir=(0, 1, 0)), keep=Keep.TOP, mode=Mode.PRIVATE)
    curve_all_shields_piece_19 = curve_all_shields_piece_19a & curve_all_shields_piece_19b
    add(curve_all_shields_piece_19)
    with BuildSketch(Plane(origin=(20.3, -15.9, 1), x_dir=(1, 0, 0), z_dir=(0, -1, 0))) as curve_all_shields_piece_20a_section:
        with BuildLine():
            CenterArc((CURVE_ALL_SHIELDS_R, CURVE_ALL_SHIELDS_R), CURVE_ALL_SHIELDS_R, 180, 90)
            Line((0, CURVE_ALL_SHIELDS_R), (0, 0))
            Line((0, 0), (CURVE_ALL_SHIELDS_R, 0))
        make_face()
    curve_all_shields_piece_20a = extrude(amount=10.6, mode=Mode.PRIVATE)
    curve_all_shields_piece_20a = split(curve_all_shields_piece_20a, bisect_by=Plane(origin=(20.526395114, -25.1, 1.226395114), z_dir=(0, 1, 0)), keep=Keep.TOP, mode=Mode.PRIVATE)
    curve_all_shields_piece_20a = split(curve_all_shields_piece_20a, bisect_by=Plane(origin=(20.526395114, -24, 1.226395114), z_dir=(0, -1, 0)), keep=Keep.TOP, mode=Mode.PRIVATE)
    with BuildSketch(Plane(origin=(22.8, -24, 1), x_dir=(0, -1, 0), z_dir=(-1, 0, 0))) as curve_all_shields_piece_20b_section:
        with BuildLine():
            CenterArc((CURVE_ALL_SHIELDS_R, CURVE_ALL_SHIELDS_R), CURVE_ALL_SHIELDS_R, 180, 90)
            Line((0, CURVE_ALL_SHIELDS_R), (0, 0))
            Line((0, 0), (CURVE_ALL_SHIELDS_R, 0))
        make_face()
    curve_all_shields_piece_20b = extrude(amount=43.1, mode=Mode.PRIVATE)
    curve_all_shields_piece_20b = split(curve_all_shields_piece_20b, bisect_by=Plane(origin=(20.3, -24.226395114, 1.226395114), z_dir=(1, 0, 0)), keep=Keep.TOP, mode=Mode.PRIVATE)
    curve_all_shields_piece_20 = curve_all_shields_piece_20a & curve_all_shields_piece_20b
    add(curve_all_shields_piece_20)


solid = part.part
